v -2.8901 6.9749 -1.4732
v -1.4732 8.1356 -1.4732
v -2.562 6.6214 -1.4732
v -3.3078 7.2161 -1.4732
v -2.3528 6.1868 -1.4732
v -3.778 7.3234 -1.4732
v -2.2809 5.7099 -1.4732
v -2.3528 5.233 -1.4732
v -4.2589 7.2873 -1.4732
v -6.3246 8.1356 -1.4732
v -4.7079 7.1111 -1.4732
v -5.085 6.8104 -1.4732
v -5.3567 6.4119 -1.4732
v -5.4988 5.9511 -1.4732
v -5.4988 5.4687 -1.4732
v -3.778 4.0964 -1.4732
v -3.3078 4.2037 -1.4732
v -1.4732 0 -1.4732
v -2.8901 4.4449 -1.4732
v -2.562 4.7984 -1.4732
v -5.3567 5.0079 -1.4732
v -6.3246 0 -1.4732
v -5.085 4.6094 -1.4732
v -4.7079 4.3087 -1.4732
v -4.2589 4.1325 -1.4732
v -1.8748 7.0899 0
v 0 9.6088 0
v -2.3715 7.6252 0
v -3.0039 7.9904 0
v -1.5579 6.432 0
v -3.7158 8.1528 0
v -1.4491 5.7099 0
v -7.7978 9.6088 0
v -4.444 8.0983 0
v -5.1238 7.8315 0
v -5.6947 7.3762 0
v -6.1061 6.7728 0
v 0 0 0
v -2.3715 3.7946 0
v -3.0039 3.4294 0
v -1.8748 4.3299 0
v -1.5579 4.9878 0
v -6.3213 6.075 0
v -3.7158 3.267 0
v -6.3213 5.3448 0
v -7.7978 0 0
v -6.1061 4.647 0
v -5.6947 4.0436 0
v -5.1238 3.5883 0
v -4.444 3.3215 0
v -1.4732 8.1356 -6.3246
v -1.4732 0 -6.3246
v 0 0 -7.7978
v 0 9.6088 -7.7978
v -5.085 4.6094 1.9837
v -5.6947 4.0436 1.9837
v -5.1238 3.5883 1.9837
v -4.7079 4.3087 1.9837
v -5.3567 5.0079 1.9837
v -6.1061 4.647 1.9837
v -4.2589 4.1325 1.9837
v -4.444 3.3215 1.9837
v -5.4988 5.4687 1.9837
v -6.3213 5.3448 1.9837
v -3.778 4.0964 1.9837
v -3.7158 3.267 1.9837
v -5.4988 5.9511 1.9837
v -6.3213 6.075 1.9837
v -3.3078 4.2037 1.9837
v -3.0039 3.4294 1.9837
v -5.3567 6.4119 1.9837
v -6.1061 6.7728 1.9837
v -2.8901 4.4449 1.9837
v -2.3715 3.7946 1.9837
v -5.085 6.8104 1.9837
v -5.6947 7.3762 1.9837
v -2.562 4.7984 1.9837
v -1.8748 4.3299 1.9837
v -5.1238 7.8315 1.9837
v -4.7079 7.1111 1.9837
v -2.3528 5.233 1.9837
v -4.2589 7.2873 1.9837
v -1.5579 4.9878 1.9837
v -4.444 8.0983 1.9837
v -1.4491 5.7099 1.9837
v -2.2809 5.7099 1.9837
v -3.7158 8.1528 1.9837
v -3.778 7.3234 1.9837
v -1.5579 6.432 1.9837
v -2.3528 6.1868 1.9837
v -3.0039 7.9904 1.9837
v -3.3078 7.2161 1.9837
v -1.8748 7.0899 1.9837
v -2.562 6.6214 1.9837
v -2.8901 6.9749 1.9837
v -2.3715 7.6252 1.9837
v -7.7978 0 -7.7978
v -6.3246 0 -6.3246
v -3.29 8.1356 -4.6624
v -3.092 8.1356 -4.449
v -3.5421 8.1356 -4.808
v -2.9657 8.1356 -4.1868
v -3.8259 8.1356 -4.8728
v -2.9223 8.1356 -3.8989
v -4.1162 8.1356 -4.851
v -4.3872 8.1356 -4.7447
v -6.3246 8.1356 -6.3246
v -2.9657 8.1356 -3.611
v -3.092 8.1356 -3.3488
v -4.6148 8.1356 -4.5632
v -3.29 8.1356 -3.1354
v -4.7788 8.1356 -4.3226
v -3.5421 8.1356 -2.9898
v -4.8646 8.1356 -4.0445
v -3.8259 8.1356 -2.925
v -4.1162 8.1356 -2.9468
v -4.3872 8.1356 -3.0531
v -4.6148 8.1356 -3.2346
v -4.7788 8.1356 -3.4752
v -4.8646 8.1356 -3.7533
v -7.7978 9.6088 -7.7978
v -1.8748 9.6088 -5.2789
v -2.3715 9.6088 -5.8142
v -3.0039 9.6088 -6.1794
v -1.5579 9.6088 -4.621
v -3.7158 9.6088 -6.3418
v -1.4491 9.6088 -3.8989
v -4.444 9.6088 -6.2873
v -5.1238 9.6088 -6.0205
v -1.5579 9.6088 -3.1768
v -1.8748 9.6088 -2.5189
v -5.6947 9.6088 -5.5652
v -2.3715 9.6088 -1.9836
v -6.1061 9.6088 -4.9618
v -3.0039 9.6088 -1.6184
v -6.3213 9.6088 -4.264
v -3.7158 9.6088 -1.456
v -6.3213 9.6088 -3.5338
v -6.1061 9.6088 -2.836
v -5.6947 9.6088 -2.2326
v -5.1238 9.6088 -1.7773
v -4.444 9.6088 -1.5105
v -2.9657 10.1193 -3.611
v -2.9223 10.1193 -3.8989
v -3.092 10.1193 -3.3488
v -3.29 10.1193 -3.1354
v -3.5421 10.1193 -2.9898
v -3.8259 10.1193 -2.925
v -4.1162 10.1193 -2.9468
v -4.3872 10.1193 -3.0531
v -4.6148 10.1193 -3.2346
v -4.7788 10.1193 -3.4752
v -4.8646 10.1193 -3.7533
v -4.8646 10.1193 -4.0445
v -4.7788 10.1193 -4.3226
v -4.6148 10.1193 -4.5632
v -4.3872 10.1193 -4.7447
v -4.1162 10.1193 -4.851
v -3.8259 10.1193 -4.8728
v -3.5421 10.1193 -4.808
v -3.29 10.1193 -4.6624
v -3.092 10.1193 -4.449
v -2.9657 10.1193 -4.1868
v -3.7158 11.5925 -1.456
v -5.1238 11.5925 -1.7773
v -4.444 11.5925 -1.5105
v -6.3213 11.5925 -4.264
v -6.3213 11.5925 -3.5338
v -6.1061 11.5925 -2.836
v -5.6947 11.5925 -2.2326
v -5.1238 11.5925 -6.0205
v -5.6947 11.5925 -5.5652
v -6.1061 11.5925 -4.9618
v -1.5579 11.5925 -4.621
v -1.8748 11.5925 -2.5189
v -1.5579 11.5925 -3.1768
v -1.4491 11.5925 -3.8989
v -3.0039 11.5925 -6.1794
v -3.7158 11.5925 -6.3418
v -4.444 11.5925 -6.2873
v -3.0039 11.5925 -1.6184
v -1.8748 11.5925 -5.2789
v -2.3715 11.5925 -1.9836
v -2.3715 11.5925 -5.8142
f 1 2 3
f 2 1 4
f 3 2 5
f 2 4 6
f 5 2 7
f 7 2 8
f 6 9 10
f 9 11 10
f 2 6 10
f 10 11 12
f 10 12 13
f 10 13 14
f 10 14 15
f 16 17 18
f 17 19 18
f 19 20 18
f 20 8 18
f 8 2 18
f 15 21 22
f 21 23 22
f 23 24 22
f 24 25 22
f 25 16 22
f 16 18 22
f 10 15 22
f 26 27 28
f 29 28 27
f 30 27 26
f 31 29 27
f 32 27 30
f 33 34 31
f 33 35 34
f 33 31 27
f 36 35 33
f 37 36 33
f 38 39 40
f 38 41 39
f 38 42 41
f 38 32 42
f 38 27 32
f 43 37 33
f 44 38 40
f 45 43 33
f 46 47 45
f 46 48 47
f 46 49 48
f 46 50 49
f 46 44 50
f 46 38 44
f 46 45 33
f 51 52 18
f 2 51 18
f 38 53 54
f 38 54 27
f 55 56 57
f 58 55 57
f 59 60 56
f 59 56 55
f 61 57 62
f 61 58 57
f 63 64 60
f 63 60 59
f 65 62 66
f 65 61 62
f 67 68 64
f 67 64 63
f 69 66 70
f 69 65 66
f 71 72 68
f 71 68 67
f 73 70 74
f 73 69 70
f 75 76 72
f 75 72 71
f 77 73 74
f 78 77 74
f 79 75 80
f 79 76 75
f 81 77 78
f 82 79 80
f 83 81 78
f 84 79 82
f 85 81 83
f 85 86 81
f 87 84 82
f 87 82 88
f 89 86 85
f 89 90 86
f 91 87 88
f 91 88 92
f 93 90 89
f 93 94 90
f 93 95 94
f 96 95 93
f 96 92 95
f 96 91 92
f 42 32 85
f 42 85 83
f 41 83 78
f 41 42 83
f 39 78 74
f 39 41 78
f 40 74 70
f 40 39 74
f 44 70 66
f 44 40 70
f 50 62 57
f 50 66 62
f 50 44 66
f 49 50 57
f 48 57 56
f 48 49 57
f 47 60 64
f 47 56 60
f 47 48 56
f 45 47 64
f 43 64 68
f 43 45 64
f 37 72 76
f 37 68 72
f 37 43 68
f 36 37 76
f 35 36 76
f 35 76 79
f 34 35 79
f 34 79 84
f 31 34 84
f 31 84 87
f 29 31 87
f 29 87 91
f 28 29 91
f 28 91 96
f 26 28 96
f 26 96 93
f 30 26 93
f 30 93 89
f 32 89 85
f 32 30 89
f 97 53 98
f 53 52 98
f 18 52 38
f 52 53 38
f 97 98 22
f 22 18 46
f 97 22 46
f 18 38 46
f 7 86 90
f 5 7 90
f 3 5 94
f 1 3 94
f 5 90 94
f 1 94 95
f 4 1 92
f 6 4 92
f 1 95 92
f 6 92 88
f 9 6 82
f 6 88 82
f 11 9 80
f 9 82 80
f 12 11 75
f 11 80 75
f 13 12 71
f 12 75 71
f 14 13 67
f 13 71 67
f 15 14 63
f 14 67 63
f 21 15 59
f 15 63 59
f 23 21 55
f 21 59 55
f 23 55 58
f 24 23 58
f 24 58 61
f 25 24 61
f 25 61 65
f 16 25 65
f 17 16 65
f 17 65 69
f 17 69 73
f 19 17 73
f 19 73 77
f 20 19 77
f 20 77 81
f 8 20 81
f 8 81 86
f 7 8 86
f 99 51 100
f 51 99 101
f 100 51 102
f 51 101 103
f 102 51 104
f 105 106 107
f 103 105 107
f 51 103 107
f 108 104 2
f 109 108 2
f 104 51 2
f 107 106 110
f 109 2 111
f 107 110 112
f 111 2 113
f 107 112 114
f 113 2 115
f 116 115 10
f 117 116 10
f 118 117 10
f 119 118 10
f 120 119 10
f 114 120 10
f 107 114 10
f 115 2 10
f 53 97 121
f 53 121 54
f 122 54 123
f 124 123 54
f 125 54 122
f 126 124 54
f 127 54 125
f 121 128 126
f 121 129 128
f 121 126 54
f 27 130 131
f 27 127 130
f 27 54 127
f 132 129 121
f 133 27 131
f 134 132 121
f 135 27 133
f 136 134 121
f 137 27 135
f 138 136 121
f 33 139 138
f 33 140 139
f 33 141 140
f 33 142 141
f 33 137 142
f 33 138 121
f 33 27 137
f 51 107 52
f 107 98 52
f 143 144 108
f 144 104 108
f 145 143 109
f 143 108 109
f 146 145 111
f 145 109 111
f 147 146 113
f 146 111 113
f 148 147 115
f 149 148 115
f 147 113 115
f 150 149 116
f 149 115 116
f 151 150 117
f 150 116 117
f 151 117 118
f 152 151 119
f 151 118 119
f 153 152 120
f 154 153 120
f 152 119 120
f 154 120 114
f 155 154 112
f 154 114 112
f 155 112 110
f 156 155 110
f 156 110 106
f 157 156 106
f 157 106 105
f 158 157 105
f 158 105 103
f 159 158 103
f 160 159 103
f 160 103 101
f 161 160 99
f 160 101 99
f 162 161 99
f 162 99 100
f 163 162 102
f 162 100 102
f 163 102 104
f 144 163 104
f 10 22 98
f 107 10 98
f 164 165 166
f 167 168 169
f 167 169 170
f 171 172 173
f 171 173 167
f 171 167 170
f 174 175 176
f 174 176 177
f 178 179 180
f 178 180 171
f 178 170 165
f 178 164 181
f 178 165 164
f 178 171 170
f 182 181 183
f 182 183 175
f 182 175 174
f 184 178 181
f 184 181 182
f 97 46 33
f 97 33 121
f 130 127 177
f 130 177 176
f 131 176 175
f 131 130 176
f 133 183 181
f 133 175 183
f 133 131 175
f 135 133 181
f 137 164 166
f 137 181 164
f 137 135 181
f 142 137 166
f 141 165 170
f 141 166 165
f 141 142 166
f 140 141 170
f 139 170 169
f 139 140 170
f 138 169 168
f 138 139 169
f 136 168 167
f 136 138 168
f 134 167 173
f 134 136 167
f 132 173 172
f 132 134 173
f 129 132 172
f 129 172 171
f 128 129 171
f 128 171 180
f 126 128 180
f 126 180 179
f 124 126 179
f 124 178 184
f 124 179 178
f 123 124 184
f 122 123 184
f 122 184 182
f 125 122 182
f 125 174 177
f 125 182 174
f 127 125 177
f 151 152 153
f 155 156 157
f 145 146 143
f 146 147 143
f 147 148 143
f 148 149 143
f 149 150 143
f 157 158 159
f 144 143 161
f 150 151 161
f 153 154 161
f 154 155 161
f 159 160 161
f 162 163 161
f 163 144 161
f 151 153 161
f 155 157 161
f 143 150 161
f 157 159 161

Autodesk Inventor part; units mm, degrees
ref_plane "YZ Plane" through (0, 0, 0) normal (1, 0, 0) x (0, 1, 0)
ref_plane "XZ Plane" through (0, 0, 0) normal (0, 1, 0) x (-1, 0, 0)
ref_plane "XY Plane" through (0, 0, 0) normal (0, 0, 1) x (1, 0, 0)
sketch "Sketch1" plane through (0, 0, 0) normal (0, 1, 0) x (-1, 0, 0)
  line L0 (0, 0) -> (7.7978, 0)
  line L1 (7.7978, 0) -> (7.7978, -7.7978)
  line L2 (7.7978, -7.7978) -> (0, -7.7978)
  line L3 (0, -7.7978) -> (0, 0)
  dimension "d0" = 7.7978
  dimension "d8" = 7.7978
extrude "Extrusion1" add sketch "Sketch1" along normal blind 9.6088
sketch "Sketch2" plane through (0, 9.6088, 0) normal (0, 1, 0) x (1, 0, 0)
  line L0 (0, 0) -> (-3.8989, 0) construction
  line L1 (-3.8989, 0) -> (-3.8989, 3.8989) construction
  line L2 (-3.8989, 3.8989) -> (0, 3.8989) construction
  line L3 (0, 3.8989) -> (0, 0) construction
  circle A0 centre (-3.8989, 3.8989) radius 2.4498
  dimension "d11" = 3.8989
  dimension "d12" = 3.8989
  dimension "d13" = 4.8997
extrude "Extrusion2" add sketch "Sketch2" along normal blind 1.9837
shell "Shell1" thickness 1.4732 removed faces 1 at (-2.5993, 0, -2.5993)
sketch "Sketch3" plane through (-7.7978, 0, 0) normal (0, 0, 1) x (1, 0, 0)
  line L0 (0, 0) -> (0, 9.6088) construction
  line L1 (0, 9.6088) -> (3.8989, 9.6088) construction
  line L2 (3.8989, 9.6088) -> (3.8989, 5.7099) construction
  line L3 (3.8989, 5.7099) -> (0, 5.7099) construction
  line L4 (0, 5.7099) -> (0, 9.6088) construction
  circle A0 centre (3.8989, 5.7099) radius 2.4498
  point P0 (7.7978, 0)
  dimension "d17" = 3.8989
  dimension "d18" = 3.8989
  dimension "d19" = 4.8997
extrude "Extrusion3" add sketch "Sketch3" along normal blind 1.9837
sketch "Sketch4" plane through (-3.8989, 5.7099, 1.9837) normal (0, 0, 1) x (1, 0, 0)
  circle A0 centre (0, 0) radius 2.4498 construction
  circle A1 centre (0, 0) radius 1.618
  point P0 (3.8989, -5.7099)
  dimension "d22" = 3.236
extrude "Extrusion4" cut sketch "Sketch4" against normal up to surface (3.4569 mm away)
equation "\"d0\" = d1"
equation "\"d8\" = d1"
equation "\"d9\" = d3"
equation "\"d11\" = 0.5 * d1"
equation "\"d12\" = 0.5 * d1"
equation "\"d13\" = d4"
equation "\"d14\" = d5"
equation "\"d16\" = d6"
equation "\"d17\" = 0.5 * d1"
equation "\"d18\" = 0.5 * d1"
equation "\"d19\" = d4"
equation "\"d20\" = d5"
equation "\"d22\" = d2"
equation "\"d23\" = d5"
equation "\"d1\" = 7.7978"
equation "\"d2\" = 3.23596"
equation "\"d3\" = 9.60882"
equation "\"d4\" = 4.89966"
equation "\"d5\" = 1.98374"
equation "\"d6\" = 1.4732"
equation "\"d7\" = 1.23952"
properties part number "1x1 tall gray with a stick out" material "ABS Plastic"
